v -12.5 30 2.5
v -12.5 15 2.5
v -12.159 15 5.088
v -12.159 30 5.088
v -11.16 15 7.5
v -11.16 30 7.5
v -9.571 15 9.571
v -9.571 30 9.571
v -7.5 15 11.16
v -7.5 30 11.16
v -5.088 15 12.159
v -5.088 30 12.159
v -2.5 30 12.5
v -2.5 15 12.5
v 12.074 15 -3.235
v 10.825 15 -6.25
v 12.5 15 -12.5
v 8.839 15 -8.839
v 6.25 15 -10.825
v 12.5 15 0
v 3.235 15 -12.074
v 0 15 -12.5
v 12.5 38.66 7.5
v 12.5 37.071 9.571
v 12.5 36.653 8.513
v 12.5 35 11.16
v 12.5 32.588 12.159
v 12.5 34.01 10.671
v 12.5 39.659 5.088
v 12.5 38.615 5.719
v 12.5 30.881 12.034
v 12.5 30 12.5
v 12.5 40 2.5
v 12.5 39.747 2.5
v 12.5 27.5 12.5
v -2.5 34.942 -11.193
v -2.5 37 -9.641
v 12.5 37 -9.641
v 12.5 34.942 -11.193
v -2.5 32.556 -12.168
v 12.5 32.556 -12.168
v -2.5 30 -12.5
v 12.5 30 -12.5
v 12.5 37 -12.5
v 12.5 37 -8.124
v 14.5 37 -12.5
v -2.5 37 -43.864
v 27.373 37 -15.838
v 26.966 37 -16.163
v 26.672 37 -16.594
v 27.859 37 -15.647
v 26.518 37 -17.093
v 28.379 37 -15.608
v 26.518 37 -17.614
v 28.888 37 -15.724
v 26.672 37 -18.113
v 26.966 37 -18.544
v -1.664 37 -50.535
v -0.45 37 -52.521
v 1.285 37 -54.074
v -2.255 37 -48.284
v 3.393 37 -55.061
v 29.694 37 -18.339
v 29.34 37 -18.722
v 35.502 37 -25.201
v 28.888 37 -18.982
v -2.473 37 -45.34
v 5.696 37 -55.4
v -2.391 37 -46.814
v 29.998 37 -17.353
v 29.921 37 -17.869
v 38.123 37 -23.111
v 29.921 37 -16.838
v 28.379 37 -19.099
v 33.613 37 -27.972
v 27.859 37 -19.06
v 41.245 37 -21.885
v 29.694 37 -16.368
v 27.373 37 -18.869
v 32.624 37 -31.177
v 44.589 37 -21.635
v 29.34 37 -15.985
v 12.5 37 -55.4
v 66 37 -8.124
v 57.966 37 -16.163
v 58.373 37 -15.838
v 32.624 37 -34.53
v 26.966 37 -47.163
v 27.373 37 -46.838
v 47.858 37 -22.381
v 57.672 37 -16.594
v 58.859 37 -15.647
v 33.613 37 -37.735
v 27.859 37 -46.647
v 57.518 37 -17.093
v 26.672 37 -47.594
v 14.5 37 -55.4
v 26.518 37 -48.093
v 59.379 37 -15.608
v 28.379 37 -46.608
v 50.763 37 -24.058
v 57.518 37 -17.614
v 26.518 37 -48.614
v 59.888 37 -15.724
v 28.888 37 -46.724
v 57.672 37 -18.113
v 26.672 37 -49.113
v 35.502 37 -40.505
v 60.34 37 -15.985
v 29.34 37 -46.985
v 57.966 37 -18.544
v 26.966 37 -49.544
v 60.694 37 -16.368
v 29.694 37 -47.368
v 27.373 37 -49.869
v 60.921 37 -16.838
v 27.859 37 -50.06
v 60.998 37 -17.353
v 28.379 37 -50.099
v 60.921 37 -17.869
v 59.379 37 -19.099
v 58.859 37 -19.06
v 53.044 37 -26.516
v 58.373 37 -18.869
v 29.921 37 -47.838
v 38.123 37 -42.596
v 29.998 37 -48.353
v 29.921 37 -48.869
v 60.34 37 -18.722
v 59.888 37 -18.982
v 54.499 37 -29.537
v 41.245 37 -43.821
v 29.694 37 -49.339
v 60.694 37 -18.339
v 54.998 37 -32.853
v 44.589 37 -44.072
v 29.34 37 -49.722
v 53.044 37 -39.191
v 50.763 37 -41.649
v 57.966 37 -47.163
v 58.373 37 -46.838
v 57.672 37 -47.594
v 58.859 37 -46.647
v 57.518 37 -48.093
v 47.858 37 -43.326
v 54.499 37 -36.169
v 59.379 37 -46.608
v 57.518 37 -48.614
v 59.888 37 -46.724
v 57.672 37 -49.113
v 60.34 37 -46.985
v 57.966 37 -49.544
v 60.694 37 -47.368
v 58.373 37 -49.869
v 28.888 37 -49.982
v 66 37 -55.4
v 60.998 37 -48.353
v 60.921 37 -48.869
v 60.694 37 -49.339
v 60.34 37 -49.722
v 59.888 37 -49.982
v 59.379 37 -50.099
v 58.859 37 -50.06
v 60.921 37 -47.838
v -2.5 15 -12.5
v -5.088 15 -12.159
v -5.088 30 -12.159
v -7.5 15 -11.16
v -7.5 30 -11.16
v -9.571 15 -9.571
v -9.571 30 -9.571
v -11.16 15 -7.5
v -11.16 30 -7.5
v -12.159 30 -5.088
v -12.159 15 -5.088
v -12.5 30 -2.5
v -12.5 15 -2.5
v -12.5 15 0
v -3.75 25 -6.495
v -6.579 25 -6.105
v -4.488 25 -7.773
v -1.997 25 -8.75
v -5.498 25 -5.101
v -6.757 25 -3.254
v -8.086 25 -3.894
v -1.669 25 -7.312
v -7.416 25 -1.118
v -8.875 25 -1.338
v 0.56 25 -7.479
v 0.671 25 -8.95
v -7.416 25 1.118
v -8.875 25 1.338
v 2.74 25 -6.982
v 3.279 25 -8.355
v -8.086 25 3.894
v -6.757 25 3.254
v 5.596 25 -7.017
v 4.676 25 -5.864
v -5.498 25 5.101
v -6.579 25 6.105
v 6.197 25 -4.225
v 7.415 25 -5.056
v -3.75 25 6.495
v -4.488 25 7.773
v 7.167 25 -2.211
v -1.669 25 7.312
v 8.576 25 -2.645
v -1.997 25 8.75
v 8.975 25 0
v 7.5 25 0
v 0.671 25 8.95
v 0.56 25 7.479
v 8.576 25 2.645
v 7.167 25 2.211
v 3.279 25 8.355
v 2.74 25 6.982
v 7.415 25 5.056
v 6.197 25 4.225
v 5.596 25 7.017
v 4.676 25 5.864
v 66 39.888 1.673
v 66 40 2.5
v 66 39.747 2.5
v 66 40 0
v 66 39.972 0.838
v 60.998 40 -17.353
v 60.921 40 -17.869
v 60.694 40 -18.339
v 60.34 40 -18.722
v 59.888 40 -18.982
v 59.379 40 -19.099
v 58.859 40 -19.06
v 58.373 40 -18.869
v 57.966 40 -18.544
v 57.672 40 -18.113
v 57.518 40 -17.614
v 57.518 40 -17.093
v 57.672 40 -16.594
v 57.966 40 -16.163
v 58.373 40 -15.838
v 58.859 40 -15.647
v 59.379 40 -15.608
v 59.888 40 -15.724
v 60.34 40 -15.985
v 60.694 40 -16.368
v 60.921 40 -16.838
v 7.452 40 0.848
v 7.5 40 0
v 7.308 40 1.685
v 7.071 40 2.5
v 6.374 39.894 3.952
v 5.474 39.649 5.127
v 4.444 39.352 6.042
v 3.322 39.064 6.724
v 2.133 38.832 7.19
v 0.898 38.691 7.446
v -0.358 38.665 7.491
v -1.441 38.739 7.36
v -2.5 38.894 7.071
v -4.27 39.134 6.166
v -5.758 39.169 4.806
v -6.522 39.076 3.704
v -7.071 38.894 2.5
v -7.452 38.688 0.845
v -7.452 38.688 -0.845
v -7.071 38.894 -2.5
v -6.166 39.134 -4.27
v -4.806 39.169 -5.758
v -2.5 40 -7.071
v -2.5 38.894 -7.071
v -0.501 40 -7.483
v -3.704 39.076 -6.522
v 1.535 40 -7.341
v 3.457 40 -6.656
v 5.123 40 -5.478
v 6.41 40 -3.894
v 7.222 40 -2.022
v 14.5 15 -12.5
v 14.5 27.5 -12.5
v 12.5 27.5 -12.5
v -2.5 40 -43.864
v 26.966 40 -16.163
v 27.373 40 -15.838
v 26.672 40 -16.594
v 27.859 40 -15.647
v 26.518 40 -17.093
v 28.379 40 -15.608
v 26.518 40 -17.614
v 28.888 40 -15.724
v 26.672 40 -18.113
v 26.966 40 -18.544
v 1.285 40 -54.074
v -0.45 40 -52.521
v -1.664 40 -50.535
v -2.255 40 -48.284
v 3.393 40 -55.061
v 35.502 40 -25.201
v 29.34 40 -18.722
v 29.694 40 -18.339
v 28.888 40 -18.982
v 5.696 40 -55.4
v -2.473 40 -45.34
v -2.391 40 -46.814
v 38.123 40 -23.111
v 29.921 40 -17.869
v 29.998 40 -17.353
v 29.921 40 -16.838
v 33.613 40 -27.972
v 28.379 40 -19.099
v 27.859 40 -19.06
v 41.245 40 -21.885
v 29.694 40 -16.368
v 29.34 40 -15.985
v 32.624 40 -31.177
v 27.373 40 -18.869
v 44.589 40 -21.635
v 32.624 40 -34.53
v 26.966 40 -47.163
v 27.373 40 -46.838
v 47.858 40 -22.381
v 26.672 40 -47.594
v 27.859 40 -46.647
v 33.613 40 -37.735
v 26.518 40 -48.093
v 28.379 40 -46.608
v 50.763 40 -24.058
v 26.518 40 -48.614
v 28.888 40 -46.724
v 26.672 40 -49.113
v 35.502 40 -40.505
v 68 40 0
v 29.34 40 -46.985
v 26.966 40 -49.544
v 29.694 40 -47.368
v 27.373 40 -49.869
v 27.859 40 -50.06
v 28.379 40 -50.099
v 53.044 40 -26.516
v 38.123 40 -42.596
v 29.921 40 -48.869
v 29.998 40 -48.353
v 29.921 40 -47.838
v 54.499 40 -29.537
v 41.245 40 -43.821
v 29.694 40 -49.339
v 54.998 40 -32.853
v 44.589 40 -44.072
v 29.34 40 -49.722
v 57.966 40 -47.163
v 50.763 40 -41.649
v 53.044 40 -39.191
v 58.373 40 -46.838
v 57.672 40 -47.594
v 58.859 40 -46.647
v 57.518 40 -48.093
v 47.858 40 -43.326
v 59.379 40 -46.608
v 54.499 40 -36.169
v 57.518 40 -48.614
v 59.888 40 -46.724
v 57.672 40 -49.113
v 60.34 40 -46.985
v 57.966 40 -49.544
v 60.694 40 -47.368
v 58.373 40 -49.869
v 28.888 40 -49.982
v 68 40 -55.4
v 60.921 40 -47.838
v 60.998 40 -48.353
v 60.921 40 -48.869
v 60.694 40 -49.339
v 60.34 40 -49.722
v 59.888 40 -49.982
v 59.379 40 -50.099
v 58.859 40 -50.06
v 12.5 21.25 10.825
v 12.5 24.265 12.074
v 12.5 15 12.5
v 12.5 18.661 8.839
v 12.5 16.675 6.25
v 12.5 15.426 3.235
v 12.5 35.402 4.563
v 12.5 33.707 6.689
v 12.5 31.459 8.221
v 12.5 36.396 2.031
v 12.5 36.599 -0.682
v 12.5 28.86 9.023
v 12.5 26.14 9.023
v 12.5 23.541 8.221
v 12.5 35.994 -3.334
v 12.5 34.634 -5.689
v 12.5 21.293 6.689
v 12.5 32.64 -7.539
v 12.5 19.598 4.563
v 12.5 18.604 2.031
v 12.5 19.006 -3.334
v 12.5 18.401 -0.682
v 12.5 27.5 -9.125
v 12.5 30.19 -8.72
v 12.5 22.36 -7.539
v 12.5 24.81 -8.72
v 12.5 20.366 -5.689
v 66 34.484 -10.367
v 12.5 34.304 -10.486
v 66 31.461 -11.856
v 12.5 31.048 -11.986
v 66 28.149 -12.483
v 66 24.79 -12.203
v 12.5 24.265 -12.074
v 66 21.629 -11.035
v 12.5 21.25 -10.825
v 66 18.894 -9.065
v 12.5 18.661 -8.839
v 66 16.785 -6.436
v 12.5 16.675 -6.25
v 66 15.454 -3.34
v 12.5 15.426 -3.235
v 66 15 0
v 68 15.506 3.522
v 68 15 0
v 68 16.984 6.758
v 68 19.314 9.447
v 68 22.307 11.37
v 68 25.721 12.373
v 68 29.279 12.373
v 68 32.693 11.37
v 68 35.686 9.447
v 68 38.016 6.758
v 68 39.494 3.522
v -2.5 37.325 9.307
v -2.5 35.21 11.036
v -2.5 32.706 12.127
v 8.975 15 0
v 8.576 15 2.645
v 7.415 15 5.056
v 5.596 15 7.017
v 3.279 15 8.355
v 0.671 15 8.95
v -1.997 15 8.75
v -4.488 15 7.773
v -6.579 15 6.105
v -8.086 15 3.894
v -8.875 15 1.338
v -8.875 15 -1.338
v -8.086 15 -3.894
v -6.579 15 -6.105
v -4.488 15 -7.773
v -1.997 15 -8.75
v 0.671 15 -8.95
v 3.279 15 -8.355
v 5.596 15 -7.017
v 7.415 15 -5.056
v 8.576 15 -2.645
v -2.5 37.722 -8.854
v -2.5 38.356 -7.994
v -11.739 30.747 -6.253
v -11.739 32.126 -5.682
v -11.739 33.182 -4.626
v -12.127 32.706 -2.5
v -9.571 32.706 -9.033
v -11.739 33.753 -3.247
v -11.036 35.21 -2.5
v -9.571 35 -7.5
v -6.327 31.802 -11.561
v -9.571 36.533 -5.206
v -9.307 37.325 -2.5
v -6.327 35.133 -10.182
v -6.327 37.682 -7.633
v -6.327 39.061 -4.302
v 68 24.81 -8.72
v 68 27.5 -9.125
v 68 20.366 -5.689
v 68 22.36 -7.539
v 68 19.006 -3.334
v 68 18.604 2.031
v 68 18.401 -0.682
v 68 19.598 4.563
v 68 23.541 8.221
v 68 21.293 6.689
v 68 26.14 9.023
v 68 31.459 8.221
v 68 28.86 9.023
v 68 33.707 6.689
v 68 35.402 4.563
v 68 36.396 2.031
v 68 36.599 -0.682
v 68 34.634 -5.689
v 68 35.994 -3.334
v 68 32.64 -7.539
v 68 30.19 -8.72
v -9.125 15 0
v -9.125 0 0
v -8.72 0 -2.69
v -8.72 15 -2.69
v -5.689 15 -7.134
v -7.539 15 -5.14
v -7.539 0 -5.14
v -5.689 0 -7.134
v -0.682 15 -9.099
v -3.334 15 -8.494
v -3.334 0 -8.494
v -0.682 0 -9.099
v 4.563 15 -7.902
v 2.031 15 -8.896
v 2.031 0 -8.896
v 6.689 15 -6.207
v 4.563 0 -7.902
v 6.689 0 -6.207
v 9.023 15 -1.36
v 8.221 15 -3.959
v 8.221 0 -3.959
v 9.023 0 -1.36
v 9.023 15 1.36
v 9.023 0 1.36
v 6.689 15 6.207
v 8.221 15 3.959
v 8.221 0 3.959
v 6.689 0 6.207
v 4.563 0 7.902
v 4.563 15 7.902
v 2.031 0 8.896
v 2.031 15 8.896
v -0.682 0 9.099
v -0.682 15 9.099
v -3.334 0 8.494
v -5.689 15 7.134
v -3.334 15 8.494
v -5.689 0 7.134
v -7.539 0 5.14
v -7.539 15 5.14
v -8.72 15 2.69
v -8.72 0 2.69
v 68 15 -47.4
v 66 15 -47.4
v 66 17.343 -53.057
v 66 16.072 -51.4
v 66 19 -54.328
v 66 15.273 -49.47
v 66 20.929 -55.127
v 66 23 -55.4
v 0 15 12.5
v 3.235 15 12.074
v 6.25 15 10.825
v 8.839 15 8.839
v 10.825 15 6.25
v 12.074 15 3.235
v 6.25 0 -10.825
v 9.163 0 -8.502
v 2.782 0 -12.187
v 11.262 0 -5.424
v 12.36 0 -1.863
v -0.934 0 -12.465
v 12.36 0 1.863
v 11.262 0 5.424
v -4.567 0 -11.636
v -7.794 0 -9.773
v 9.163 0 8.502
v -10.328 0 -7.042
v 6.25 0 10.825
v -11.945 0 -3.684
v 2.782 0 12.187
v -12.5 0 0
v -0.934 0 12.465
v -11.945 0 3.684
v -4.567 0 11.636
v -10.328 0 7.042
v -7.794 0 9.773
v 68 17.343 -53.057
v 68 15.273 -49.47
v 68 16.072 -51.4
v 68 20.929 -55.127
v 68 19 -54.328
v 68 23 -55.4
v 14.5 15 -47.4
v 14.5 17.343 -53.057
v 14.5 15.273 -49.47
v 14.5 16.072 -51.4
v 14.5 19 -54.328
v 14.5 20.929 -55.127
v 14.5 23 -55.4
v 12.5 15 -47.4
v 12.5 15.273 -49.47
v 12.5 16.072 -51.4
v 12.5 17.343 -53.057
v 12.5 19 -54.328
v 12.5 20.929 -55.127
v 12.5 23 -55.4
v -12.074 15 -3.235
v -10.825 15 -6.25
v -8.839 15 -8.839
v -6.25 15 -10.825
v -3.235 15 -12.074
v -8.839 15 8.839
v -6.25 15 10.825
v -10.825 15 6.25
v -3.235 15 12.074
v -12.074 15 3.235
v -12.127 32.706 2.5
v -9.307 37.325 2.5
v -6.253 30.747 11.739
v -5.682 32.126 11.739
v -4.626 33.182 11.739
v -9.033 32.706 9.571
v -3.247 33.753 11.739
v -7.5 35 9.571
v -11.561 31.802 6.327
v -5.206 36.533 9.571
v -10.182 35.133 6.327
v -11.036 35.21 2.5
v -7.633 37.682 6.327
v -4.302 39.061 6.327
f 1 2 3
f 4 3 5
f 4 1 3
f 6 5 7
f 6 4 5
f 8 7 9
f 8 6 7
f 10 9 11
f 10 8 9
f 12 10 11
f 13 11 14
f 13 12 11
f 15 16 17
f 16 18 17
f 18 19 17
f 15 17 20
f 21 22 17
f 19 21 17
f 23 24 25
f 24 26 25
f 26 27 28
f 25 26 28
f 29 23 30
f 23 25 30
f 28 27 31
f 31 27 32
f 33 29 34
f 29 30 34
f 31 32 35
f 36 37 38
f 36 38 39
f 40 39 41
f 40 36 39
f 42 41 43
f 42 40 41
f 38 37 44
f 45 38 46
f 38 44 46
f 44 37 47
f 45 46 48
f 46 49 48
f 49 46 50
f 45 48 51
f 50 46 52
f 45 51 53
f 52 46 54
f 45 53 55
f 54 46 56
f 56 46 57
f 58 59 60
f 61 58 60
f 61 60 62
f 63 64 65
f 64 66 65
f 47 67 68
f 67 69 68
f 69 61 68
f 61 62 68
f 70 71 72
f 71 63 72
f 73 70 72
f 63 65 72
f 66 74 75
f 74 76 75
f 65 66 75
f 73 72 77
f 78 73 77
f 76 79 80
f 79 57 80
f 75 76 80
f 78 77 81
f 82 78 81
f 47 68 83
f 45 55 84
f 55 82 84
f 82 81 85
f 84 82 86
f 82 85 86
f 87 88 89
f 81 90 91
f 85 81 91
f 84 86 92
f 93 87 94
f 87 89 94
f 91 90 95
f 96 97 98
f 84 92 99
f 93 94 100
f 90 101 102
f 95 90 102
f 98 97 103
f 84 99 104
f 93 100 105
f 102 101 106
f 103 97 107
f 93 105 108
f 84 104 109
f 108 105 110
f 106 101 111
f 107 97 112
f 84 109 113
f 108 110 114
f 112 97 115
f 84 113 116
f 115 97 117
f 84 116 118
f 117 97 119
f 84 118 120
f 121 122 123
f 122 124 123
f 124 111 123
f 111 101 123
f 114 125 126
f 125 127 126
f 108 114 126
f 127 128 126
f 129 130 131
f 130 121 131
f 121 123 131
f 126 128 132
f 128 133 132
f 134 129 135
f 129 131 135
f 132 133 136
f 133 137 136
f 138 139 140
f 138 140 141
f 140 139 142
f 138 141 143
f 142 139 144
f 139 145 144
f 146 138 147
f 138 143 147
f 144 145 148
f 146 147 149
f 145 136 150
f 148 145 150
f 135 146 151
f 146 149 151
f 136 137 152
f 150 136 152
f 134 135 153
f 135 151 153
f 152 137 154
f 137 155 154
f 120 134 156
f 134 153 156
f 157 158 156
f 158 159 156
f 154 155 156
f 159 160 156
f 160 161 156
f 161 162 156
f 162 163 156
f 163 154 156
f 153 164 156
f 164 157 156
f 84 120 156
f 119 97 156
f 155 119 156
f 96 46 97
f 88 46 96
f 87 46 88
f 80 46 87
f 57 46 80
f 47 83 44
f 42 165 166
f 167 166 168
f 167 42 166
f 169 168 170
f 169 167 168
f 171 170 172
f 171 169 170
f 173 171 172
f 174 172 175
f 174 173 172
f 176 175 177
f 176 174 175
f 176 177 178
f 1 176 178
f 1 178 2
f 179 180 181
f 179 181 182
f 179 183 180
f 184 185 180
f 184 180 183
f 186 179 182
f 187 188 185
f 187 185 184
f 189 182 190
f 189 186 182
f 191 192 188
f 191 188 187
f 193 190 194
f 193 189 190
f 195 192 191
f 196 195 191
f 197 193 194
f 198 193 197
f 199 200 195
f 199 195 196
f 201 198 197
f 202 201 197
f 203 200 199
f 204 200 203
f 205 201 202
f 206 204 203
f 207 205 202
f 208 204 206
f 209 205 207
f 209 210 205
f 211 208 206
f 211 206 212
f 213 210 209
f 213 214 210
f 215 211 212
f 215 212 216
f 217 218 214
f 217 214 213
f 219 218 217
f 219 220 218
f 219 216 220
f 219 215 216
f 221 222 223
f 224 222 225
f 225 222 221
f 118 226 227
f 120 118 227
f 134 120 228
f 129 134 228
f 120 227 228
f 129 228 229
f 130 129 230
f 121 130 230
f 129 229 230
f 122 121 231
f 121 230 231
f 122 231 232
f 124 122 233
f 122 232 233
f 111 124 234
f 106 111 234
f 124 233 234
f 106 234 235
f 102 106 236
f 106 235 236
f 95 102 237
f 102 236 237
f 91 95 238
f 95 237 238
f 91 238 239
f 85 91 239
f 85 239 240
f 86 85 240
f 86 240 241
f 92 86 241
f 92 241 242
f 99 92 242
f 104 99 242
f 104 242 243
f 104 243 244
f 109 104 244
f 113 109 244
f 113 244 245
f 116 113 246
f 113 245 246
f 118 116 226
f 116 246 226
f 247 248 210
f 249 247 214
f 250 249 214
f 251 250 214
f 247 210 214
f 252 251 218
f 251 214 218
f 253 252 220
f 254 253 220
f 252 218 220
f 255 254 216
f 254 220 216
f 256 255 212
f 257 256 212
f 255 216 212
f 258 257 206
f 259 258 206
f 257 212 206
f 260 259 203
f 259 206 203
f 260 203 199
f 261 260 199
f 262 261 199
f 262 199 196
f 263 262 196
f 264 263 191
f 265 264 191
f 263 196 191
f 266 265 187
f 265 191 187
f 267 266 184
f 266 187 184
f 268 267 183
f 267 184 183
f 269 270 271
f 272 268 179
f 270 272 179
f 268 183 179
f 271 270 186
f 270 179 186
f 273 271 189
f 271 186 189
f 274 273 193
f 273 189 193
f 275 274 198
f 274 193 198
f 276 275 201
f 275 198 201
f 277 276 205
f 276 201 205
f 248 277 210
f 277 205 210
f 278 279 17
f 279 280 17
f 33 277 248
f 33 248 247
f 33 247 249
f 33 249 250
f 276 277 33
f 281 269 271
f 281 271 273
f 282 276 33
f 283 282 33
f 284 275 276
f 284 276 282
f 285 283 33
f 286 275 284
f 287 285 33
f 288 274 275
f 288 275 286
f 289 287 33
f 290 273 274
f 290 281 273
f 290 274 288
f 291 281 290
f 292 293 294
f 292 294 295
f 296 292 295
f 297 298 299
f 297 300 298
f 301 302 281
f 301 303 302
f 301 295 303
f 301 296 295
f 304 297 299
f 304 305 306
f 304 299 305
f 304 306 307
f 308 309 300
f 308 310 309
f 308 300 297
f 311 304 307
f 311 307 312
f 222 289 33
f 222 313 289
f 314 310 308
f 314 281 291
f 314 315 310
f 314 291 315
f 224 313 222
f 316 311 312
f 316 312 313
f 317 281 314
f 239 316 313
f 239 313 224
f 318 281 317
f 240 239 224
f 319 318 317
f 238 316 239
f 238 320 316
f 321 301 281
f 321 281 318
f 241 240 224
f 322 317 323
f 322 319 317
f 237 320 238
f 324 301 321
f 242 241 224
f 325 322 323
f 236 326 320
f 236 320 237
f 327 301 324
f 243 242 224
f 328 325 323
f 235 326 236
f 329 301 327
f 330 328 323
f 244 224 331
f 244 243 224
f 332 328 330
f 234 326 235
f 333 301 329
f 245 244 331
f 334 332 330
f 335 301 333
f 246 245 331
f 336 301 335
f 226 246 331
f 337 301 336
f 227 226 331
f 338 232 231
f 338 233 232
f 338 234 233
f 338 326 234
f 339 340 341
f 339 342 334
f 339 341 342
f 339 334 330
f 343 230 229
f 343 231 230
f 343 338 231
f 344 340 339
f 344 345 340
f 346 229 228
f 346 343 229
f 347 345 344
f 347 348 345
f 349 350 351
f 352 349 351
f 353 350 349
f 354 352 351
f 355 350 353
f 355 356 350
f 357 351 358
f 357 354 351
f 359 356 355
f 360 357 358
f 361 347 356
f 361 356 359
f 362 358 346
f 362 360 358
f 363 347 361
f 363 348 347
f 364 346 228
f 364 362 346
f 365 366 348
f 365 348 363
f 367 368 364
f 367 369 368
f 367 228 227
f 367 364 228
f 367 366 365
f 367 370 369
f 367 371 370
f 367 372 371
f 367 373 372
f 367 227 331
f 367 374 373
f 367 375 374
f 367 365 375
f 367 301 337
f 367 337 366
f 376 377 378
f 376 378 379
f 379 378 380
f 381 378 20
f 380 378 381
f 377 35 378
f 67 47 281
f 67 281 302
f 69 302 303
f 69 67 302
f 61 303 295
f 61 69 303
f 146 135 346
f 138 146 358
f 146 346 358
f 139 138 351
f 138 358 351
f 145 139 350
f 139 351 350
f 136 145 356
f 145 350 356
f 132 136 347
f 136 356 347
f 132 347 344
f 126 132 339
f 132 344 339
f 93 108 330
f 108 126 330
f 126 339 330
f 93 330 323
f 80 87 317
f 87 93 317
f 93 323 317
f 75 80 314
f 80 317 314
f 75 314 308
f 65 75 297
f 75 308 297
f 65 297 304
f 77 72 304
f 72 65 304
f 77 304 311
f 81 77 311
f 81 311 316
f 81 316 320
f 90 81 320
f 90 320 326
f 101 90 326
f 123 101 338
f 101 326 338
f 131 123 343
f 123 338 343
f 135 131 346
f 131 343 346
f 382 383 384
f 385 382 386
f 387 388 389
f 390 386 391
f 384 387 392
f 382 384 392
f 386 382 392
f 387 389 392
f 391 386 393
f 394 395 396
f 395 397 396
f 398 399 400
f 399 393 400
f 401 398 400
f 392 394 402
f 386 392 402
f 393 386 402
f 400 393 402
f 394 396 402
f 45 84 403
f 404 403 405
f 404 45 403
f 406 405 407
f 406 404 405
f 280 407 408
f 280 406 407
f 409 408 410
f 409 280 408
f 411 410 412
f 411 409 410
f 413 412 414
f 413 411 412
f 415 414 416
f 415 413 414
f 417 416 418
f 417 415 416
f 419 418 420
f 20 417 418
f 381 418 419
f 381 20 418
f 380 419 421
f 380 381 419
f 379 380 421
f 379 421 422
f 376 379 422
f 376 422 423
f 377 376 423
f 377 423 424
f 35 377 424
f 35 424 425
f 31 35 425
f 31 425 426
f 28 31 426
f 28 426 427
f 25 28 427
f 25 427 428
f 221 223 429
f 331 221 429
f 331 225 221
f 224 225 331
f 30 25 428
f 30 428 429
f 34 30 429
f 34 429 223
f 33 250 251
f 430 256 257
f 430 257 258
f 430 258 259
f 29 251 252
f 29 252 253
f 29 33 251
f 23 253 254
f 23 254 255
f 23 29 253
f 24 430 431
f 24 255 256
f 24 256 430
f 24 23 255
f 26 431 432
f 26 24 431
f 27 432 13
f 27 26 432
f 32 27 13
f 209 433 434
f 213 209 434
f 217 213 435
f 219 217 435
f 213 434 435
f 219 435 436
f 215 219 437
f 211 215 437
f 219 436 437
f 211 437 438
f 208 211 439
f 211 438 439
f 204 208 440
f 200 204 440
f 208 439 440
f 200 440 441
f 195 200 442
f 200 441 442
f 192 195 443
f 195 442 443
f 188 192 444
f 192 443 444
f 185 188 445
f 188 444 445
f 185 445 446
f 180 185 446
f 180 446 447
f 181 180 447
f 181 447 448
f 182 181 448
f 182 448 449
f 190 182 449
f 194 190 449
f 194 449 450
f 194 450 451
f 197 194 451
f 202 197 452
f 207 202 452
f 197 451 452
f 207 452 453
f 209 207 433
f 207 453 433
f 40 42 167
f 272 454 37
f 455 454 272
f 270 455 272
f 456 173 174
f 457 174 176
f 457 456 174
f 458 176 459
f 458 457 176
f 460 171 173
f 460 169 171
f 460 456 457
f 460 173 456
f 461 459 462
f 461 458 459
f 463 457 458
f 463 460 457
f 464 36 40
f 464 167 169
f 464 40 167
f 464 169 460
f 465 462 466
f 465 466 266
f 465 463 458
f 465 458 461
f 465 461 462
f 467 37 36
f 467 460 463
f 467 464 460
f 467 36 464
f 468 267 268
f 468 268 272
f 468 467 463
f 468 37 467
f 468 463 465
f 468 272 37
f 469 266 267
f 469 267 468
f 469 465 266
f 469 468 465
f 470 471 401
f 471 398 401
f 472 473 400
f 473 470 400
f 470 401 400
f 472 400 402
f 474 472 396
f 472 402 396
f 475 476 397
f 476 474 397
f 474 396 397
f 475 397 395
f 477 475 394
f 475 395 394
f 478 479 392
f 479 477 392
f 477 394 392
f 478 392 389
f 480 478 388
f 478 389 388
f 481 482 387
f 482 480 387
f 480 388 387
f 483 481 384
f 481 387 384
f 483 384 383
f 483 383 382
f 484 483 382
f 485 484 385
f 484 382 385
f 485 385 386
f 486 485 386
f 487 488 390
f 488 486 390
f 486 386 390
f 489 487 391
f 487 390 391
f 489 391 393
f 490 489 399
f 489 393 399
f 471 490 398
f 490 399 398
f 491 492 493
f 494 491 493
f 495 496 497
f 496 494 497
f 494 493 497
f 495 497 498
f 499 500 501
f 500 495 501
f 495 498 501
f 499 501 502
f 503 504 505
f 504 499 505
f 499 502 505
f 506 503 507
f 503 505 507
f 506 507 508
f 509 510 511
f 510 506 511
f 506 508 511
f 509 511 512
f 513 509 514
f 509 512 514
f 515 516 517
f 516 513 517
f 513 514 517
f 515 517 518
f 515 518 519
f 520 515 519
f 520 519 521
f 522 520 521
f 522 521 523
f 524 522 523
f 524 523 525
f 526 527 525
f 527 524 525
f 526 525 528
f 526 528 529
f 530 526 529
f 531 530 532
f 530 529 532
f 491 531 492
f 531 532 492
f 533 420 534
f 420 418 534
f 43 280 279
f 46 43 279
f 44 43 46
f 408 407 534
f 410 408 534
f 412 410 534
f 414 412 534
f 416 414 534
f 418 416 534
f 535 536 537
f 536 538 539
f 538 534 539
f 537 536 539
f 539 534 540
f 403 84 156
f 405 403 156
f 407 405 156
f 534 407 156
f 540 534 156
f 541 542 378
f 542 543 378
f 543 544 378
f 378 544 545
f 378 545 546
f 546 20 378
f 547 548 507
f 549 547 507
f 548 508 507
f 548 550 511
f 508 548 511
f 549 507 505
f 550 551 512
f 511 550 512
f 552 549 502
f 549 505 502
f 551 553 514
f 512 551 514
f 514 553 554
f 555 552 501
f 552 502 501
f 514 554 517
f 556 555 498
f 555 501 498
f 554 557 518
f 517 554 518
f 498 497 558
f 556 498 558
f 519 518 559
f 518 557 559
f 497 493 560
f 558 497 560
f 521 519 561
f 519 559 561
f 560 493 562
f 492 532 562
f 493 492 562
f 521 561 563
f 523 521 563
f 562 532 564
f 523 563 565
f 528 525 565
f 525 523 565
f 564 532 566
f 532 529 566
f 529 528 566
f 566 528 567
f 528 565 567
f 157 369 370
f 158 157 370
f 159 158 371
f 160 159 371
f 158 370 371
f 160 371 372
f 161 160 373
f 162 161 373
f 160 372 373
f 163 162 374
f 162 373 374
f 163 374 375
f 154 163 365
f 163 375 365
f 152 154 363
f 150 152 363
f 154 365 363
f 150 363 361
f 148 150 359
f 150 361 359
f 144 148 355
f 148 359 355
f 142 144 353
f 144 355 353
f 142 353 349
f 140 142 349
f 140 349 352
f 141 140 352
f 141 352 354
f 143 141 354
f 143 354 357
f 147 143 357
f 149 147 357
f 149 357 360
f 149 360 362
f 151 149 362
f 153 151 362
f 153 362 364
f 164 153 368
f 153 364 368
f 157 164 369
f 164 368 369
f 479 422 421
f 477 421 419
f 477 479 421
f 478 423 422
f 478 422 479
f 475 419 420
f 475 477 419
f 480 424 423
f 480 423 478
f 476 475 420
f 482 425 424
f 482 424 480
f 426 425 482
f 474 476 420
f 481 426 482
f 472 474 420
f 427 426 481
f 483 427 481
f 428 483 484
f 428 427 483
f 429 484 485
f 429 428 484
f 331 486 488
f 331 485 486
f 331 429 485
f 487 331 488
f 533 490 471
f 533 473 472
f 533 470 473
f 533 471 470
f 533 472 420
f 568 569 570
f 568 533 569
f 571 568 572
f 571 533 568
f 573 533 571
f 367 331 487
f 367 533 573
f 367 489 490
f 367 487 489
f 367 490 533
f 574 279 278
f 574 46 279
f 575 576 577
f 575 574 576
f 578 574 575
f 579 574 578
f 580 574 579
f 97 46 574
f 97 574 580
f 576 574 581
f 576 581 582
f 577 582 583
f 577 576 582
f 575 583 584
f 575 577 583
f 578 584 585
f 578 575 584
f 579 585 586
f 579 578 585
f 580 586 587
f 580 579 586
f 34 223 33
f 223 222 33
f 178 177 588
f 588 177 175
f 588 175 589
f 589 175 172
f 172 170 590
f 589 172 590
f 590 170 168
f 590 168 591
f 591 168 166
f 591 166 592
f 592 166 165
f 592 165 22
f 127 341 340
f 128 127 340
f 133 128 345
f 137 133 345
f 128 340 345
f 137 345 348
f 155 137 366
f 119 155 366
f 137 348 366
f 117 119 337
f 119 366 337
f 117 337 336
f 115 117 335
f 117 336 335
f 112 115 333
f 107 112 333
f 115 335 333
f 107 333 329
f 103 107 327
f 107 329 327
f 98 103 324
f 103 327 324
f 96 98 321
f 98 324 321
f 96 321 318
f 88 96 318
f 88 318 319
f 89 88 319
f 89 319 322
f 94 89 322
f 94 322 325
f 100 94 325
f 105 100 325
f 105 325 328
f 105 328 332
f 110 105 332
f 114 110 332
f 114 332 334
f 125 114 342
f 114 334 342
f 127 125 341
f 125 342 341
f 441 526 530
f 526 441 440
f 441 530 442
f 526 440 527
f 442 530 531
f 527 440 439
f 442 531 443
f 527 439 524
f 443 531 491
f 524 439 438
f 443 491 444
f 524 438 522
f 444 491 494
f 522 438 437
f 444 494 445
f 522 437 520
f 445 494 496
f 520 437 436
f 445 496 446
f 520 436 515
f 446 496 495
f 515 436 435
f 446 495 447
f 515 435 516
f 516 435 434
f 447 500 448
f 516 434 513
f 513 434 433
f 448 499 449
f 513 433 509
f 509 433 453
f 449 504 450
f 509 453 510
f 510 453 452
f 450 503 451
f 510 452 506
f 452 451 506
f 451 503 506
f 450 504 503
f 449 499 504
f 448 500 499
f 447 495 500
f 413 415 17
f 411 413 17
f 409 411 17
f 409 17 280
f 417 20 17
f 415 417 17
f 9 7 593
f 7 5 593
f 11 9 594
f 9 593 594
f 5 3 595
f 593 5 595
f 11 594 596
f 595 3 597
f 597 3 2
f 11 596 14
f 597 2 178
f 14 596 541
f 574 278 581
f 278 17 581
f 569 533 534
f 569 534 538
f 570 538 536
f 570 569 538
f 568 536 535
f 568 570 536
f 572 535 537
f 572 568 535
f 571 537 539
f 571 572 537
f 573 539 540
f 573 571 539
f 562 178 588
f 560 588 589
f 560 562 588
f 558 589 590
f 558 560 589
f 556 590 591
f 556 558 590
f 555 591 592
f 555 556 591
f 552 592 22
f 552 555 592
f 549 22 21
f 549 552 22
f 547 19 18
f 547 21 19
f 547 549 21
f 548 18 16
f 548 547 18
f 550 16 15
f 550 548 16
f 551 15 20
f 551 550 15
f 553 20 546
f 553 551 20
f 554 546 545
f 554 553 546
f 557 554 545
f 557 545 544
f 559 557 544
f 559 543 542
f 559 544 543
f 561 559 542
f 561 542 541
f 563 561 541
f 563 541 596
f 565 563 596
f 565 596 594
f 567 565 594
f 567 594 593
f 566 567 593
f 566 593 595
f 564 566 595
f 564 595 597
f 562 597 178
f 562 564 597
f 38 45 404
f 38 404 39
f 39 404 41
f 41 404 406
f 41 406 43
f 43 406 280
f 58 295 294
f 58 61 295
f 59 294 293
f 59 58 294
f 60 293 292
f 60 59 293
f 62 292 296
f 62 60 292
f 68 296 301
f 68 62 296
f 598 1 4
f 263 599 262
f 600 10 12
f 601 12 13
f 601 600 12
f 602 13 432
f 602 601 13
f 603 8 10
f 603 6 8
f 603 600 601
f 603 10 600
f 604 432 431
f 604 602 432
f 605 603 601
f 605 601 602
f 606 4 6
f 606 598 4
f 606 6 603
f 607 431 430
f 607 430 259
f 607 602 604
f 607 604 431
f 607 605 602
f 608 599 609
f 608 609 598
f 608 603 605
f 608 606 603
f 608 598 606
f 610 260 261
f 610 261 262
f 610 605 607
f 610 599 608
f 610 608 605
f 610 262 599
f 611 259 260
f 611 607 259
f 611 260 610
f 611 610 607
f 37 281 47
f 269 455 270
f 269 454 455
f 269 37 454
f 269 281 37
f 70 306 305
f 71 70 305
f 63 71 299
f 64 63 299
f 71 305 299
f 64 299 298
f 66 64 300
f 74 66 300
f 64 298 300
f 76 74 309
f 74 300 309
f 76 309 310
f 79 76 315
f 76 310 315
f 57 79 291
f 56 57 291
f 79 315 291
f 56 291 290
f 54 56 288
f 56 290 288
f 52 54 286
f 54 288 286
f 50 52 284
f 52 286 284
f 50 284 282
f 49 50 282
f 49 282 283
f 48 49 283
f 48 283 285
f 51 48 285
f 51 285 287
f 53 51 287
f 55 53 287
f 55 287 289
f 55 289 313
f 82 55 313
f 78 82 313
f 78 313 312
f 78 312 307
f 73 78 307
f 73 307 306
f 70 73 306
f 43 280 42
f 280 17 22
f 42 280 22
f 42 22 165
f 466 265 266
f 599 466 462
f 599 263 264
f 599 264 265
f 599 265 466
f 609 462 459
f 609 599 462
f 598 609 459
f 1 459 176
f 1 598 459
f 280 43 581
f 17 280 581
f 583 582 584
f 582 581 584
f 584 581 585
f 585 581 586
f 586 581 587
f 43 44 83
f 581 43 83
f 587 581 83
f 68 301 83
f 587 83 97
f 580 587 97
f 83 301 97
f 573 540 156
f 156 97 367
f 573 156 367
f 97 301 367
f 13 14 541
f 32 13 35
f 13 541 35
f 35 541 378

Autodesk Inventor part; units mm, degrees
ref_plane "YZ Plane" through (0, 0, 0) normal (1, 0, 0) x (0, 1, 0)
ref_plane "XZ Plane" through (0, 0, 0) normal (0, 1, 0) x (-1, 0, 0)
ref_plane "XY Plane" through (0, 0, 0) normal (0, 0, 1) x (1, 0, 0)
sketch "Sketch1" plane through (0, 0, 0) normal (0, 1, 0) x (-1, 0, 0)
  circle A0 centre (0, 0) radius 9.125
  circle A1 centre (0, 0) radius 12.5
  dimension "d0" = 18.25
  dimension "d1" = 25
extrude "Extrusion1" add sketch "Sketch1" along normal blind 15
sketch "Sketch2" plane through (0, 15, 0) normal (0, 1, 0) x (1, 0, 0)
  line L0 (-12.5, -12.5) -> (12.5, -12.5)
  line L1 (12.5, -12.5) -> (12.5, 12.5)
  line L2 (12.5, 12.5) -> (-12.5, 12.5)
  line L3 (-12.5, 12.5) -> (-12.5, -12.5)
  point P0 (0, 0)
extrude "Extrusion2" add sketch "Sketch2" along normal blind 25
sketch "Sketch3" plane through (12.5, 15, 12.5) normal (1, 0, 0) x (0, 0, -1)
  circle A0 centre (12.5, 12.5) radius 12.5
  circle A1 centre (12.5, 12.5) radius 9.125
  point P0 (12.5, -15)
  dimension "d6" = 25
  dimension "d7" = 18.25
extrude "Extrusion3" add sketch "Sketch3" along normal blind 53.5
fillet "Fillet1" radius 10 5 edges at (0, 40, -12.5) (-12.5, 40, 0) (0, 40, 12.5) (-12.5, 27.5, 12.5) (-12.5, 27.5, -12.5)
sketch "Sketch4" plane through (0, 40, 0) normal (0, 1, 0) x (1, 0, 0)
  circle A0 centre (43.7484, 32.8534) radius 11.25
  circle A1 centre (43.7484, 32.8534) radius 2.75
  circle A2 centre (28.2484, 17.3534) radius 1.75
  circle A3 centre (28.2484, 48.3534) radius 1.75
  circle A4 centre (59.2484, 48.3534) radius 1.75
  circle A5 centre (59.2484, 17.3534) radius 1.75
  line L0 (-2.5, -2.5) -> (-2.5, 2.5) projected
  line L1 (-2.5, -2.5) -> (55.5607, -2.5)
  line L2 (66, -2.5) -> (66, 83.8642)
  line L3 (55.5607, 83.8642) -> (-2.5, 83.8642)
  line L4 (-2.5, 83.8642) -> (-2.5, -2.5)
  line L5 (-47.4497, 33) -> (137.0981, 33)
  line L6 (43.6, -25.832) -> (43.6, 75.2549)
  line L7 (55.5607, 83.8642) -> (66, 83.8642)
  line L8 (66, -2.5) -> (47.9455, -2.5)
  line L9 (66, -12.5) -> (66, 12.5) projected
  point P0 (0, 0)
  dimension "d13" = 22.5
  dimension "d14" = 5.5
  dimension "d15" = 3.5
  dimension "d16" = 15.5
  dimension "d20" = 360
  dimension "d37" = 33
  dimension "d43" = 43.6
  dimension "d44" = 0
extrude "Extrusion4" add sketch "Sketch4" against normal blind 3 contours A0 L5 L2 L8 L1 L6 | A0 L5 L4 L3 L7 L2 | L6 L1 L0 L4 L5 A0
fillet "Fillet2" radius 40 1 edges at (-2.5, 38.5, -83.8642)
fillet "Fillet3" radius 10 1 edges at (66, 38.5, -83.8642)
sketch "Sketch5" plane through (66, 27.5, 0) normal (1, 0, 0) x (0, 0, -1)
  circle A0 centre (0, 0) radius 12.5
  line L0 (0, -12.5) -> (-12.5, -12.5) projected
  line L1 (0, -12.5) -> (73.8642, -12.5)
  line L2 (83.8642, 9.5) -> (83.8642, 12.5) projected
  line L3 (73.8642, -12.5) -> (73.8642, 12.5)
  line L4 (73.8642, 12.5) -> (0, 12.5)
  circle A1 centre (0, 0) radius 9.125
  line L5 (73.8642, 12.5) -> (73.8642, 9.5) projected
  point P0 (0, -27.5)
  dimension "d28" = 0
  dimension "d45" = 18.25
extrude "Extrusion5" add sketch "Sketch5" along normal blind 2
fillet "Fillet5" radius 8 2 edges at (67, 15, -73.8642) (68, 27.5, -73.8642)
sketch "Sketch6" plane through (12.5, 15, 0) normal (1, 0, 0) x (0, 0, -1)
  line L0 (12.5, 15) -> (12.5, 0) projected
  line L1 (12.5, 0) -> (65.8642, 0)
  line L2 (0, 0) -> (65.8642, 0) projected
  line L3 (65.8642, 0) -> (65.8642, 22)
  line L4 (44.1034, 22) -> (21.6034, 22) projected
  line L5 (65.8642, 0) -> (12.5, 0)
  line L6 (12.5, 0) -> (12.5, 22)
  line L7 (12.5, 22) -> (65.8642, 22)
  line L8 (65.8642, 22) -> (65.8642, 0)
  point P0 (0, -15)
  point P1 (12.5, 14.9361)
extrude "Extrusion6" add sketch "Sketch6" along normal blind 2
fillet "Fillet6" radius 8 1 edges at (13.5, 15, -65.8642)
sketch "Sketch7" plane through (0, 0, 0) normal (0, -1, 0) x (1, 0, 0)
  circle A0 centre (0, 0) radius 8.975
extrude "Extrusion7" cut sketch "Sketch7" against normal blind 25
sketch "Sketch8" plane through (0, 37, 0) normal (0, -1, 0) x (1, 0, 0)
  line L0 (-23.3822, -55.3999) -> (103.7661, -55.3999)
  line L1 (103.7661, -55.3999) -> (103.7661, -98.1886)
  line L2 (103.7661, -98.1886) -> (-23.3822, -98.1886)
  line L3 (-23.3822, -98.1886) -> (-23.3822, -55.3999)
  point P0 (0, 0)
extrude "Extrusion8" cut sketch "Sketch8" along normal mid plane 200
fillet "Fillet7" radius 8 3 edges at (-0.8005, 38.5, -55.3999) (13.5, 15, -55.3999) (67, 15, -55.3999)
extrude "Extrusion9" cut sketch "Sketch4" against normal blind 200 contours A2 | A5
sketch "Sketch9" plane through (0, 25, 0) normal (0, -1, 0) x (1, 0, 0)
  circle A0 centre (0, 0) radius 7.5
  dimension "d46" = 15
extrude "Extrusion10" cut sketch "Sketch9" against normal blind 60
properties part number "zmotormount"
